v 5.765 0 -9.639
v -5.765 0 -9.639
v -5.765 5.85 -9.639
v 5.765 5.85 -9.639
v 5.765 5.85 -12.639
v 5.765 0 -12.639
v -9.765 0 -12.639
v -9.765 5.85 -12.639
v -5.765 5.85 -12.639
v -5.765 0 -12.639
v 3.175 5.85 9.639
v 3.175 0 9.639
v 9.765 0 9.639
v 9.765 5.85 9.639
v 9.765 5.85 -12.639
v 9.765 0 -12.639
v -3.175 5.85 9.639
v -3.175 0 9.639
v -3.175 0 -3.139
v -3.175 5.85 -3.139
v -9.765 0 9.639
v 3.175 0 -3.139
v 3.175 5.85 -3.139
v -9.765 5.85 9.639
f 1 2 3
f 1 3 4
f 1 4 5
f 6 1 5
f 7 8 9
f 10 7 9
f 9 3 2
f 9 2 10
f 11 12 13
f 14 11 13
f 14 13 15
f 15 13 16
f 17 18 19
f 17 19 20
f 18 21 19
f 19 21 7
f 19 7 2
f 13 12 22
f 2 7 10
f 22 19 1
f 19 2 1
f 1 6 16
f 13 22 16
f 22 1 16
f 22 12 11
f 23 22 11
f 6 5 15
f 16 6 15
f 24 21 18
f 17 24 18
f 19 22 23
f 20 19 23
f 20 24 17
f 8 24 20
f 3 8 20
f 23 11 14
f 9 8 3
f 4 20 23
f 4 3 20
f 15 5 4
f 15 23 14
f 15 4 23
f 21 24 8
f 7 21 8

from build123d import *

# Parameters (mm, degrees)
SKETCH1_W           = 19.53
SKETCH1_H           = 19.278
BOSS_EXTRUDE1_DEPTH = 5.85
SKETCH2_W           = 4
SKETCH2_H           = 3
BOSS_EXTRUDE2_DEPTH = 5.85
CAVITY1_START       = -3.175
CAVITY1_OUTLINE_W   = 5.85
CAVITY1_OUTLINE_H   = 12.778
CAVITY1_DEPTH       = 6.35


# Read off the part's stored shape, not the designer's step: Cavity1
with BuildPart() as part:
    # Sketch1 → Boss-Extrude1 (new body)
    with BuildSketch(Plane(origin=(0, 0, 0), x_dir=(1, 0, 0), z_dir=(0, 1, 0))):
        Rectangle(SKETCH1_W, SKETCH1_H)
    extrude(amount=BOSS_EXTRUDE1_DEPTH)

    # Sketch2 → Boss-Extrude2 (add)
    with BuildSketch(Plane(origin=(0, 5.85, 0), x_dir=(1, 0, 0), z_dir=(0, 1, 0))):
        with Locations((-7.765, 11.139)):
            Rectangle(SKETCH2_W, SKETCH2_H)
        with Locations((7.765, 11.139)):
            Rectangle(SKETCH2_W, SKETCH2_H)
    extrude(amount=-BOSS_EXTRUDE2_DEPTH)

    # Cavity1 outline → Cavity1 (cut)
    with BuildSketch(Plane.YZ.offset(CAVITY1_START)):
        with Locations((2.925, 3.25)):
            Rectangle(CAVITY1_OUTLINE_W, CAVITY1_OUTLINE_H)
    extrude(amount=CAVITY1_DEPTH, mode=Mode.SUBTRACT)


solid = part.part
